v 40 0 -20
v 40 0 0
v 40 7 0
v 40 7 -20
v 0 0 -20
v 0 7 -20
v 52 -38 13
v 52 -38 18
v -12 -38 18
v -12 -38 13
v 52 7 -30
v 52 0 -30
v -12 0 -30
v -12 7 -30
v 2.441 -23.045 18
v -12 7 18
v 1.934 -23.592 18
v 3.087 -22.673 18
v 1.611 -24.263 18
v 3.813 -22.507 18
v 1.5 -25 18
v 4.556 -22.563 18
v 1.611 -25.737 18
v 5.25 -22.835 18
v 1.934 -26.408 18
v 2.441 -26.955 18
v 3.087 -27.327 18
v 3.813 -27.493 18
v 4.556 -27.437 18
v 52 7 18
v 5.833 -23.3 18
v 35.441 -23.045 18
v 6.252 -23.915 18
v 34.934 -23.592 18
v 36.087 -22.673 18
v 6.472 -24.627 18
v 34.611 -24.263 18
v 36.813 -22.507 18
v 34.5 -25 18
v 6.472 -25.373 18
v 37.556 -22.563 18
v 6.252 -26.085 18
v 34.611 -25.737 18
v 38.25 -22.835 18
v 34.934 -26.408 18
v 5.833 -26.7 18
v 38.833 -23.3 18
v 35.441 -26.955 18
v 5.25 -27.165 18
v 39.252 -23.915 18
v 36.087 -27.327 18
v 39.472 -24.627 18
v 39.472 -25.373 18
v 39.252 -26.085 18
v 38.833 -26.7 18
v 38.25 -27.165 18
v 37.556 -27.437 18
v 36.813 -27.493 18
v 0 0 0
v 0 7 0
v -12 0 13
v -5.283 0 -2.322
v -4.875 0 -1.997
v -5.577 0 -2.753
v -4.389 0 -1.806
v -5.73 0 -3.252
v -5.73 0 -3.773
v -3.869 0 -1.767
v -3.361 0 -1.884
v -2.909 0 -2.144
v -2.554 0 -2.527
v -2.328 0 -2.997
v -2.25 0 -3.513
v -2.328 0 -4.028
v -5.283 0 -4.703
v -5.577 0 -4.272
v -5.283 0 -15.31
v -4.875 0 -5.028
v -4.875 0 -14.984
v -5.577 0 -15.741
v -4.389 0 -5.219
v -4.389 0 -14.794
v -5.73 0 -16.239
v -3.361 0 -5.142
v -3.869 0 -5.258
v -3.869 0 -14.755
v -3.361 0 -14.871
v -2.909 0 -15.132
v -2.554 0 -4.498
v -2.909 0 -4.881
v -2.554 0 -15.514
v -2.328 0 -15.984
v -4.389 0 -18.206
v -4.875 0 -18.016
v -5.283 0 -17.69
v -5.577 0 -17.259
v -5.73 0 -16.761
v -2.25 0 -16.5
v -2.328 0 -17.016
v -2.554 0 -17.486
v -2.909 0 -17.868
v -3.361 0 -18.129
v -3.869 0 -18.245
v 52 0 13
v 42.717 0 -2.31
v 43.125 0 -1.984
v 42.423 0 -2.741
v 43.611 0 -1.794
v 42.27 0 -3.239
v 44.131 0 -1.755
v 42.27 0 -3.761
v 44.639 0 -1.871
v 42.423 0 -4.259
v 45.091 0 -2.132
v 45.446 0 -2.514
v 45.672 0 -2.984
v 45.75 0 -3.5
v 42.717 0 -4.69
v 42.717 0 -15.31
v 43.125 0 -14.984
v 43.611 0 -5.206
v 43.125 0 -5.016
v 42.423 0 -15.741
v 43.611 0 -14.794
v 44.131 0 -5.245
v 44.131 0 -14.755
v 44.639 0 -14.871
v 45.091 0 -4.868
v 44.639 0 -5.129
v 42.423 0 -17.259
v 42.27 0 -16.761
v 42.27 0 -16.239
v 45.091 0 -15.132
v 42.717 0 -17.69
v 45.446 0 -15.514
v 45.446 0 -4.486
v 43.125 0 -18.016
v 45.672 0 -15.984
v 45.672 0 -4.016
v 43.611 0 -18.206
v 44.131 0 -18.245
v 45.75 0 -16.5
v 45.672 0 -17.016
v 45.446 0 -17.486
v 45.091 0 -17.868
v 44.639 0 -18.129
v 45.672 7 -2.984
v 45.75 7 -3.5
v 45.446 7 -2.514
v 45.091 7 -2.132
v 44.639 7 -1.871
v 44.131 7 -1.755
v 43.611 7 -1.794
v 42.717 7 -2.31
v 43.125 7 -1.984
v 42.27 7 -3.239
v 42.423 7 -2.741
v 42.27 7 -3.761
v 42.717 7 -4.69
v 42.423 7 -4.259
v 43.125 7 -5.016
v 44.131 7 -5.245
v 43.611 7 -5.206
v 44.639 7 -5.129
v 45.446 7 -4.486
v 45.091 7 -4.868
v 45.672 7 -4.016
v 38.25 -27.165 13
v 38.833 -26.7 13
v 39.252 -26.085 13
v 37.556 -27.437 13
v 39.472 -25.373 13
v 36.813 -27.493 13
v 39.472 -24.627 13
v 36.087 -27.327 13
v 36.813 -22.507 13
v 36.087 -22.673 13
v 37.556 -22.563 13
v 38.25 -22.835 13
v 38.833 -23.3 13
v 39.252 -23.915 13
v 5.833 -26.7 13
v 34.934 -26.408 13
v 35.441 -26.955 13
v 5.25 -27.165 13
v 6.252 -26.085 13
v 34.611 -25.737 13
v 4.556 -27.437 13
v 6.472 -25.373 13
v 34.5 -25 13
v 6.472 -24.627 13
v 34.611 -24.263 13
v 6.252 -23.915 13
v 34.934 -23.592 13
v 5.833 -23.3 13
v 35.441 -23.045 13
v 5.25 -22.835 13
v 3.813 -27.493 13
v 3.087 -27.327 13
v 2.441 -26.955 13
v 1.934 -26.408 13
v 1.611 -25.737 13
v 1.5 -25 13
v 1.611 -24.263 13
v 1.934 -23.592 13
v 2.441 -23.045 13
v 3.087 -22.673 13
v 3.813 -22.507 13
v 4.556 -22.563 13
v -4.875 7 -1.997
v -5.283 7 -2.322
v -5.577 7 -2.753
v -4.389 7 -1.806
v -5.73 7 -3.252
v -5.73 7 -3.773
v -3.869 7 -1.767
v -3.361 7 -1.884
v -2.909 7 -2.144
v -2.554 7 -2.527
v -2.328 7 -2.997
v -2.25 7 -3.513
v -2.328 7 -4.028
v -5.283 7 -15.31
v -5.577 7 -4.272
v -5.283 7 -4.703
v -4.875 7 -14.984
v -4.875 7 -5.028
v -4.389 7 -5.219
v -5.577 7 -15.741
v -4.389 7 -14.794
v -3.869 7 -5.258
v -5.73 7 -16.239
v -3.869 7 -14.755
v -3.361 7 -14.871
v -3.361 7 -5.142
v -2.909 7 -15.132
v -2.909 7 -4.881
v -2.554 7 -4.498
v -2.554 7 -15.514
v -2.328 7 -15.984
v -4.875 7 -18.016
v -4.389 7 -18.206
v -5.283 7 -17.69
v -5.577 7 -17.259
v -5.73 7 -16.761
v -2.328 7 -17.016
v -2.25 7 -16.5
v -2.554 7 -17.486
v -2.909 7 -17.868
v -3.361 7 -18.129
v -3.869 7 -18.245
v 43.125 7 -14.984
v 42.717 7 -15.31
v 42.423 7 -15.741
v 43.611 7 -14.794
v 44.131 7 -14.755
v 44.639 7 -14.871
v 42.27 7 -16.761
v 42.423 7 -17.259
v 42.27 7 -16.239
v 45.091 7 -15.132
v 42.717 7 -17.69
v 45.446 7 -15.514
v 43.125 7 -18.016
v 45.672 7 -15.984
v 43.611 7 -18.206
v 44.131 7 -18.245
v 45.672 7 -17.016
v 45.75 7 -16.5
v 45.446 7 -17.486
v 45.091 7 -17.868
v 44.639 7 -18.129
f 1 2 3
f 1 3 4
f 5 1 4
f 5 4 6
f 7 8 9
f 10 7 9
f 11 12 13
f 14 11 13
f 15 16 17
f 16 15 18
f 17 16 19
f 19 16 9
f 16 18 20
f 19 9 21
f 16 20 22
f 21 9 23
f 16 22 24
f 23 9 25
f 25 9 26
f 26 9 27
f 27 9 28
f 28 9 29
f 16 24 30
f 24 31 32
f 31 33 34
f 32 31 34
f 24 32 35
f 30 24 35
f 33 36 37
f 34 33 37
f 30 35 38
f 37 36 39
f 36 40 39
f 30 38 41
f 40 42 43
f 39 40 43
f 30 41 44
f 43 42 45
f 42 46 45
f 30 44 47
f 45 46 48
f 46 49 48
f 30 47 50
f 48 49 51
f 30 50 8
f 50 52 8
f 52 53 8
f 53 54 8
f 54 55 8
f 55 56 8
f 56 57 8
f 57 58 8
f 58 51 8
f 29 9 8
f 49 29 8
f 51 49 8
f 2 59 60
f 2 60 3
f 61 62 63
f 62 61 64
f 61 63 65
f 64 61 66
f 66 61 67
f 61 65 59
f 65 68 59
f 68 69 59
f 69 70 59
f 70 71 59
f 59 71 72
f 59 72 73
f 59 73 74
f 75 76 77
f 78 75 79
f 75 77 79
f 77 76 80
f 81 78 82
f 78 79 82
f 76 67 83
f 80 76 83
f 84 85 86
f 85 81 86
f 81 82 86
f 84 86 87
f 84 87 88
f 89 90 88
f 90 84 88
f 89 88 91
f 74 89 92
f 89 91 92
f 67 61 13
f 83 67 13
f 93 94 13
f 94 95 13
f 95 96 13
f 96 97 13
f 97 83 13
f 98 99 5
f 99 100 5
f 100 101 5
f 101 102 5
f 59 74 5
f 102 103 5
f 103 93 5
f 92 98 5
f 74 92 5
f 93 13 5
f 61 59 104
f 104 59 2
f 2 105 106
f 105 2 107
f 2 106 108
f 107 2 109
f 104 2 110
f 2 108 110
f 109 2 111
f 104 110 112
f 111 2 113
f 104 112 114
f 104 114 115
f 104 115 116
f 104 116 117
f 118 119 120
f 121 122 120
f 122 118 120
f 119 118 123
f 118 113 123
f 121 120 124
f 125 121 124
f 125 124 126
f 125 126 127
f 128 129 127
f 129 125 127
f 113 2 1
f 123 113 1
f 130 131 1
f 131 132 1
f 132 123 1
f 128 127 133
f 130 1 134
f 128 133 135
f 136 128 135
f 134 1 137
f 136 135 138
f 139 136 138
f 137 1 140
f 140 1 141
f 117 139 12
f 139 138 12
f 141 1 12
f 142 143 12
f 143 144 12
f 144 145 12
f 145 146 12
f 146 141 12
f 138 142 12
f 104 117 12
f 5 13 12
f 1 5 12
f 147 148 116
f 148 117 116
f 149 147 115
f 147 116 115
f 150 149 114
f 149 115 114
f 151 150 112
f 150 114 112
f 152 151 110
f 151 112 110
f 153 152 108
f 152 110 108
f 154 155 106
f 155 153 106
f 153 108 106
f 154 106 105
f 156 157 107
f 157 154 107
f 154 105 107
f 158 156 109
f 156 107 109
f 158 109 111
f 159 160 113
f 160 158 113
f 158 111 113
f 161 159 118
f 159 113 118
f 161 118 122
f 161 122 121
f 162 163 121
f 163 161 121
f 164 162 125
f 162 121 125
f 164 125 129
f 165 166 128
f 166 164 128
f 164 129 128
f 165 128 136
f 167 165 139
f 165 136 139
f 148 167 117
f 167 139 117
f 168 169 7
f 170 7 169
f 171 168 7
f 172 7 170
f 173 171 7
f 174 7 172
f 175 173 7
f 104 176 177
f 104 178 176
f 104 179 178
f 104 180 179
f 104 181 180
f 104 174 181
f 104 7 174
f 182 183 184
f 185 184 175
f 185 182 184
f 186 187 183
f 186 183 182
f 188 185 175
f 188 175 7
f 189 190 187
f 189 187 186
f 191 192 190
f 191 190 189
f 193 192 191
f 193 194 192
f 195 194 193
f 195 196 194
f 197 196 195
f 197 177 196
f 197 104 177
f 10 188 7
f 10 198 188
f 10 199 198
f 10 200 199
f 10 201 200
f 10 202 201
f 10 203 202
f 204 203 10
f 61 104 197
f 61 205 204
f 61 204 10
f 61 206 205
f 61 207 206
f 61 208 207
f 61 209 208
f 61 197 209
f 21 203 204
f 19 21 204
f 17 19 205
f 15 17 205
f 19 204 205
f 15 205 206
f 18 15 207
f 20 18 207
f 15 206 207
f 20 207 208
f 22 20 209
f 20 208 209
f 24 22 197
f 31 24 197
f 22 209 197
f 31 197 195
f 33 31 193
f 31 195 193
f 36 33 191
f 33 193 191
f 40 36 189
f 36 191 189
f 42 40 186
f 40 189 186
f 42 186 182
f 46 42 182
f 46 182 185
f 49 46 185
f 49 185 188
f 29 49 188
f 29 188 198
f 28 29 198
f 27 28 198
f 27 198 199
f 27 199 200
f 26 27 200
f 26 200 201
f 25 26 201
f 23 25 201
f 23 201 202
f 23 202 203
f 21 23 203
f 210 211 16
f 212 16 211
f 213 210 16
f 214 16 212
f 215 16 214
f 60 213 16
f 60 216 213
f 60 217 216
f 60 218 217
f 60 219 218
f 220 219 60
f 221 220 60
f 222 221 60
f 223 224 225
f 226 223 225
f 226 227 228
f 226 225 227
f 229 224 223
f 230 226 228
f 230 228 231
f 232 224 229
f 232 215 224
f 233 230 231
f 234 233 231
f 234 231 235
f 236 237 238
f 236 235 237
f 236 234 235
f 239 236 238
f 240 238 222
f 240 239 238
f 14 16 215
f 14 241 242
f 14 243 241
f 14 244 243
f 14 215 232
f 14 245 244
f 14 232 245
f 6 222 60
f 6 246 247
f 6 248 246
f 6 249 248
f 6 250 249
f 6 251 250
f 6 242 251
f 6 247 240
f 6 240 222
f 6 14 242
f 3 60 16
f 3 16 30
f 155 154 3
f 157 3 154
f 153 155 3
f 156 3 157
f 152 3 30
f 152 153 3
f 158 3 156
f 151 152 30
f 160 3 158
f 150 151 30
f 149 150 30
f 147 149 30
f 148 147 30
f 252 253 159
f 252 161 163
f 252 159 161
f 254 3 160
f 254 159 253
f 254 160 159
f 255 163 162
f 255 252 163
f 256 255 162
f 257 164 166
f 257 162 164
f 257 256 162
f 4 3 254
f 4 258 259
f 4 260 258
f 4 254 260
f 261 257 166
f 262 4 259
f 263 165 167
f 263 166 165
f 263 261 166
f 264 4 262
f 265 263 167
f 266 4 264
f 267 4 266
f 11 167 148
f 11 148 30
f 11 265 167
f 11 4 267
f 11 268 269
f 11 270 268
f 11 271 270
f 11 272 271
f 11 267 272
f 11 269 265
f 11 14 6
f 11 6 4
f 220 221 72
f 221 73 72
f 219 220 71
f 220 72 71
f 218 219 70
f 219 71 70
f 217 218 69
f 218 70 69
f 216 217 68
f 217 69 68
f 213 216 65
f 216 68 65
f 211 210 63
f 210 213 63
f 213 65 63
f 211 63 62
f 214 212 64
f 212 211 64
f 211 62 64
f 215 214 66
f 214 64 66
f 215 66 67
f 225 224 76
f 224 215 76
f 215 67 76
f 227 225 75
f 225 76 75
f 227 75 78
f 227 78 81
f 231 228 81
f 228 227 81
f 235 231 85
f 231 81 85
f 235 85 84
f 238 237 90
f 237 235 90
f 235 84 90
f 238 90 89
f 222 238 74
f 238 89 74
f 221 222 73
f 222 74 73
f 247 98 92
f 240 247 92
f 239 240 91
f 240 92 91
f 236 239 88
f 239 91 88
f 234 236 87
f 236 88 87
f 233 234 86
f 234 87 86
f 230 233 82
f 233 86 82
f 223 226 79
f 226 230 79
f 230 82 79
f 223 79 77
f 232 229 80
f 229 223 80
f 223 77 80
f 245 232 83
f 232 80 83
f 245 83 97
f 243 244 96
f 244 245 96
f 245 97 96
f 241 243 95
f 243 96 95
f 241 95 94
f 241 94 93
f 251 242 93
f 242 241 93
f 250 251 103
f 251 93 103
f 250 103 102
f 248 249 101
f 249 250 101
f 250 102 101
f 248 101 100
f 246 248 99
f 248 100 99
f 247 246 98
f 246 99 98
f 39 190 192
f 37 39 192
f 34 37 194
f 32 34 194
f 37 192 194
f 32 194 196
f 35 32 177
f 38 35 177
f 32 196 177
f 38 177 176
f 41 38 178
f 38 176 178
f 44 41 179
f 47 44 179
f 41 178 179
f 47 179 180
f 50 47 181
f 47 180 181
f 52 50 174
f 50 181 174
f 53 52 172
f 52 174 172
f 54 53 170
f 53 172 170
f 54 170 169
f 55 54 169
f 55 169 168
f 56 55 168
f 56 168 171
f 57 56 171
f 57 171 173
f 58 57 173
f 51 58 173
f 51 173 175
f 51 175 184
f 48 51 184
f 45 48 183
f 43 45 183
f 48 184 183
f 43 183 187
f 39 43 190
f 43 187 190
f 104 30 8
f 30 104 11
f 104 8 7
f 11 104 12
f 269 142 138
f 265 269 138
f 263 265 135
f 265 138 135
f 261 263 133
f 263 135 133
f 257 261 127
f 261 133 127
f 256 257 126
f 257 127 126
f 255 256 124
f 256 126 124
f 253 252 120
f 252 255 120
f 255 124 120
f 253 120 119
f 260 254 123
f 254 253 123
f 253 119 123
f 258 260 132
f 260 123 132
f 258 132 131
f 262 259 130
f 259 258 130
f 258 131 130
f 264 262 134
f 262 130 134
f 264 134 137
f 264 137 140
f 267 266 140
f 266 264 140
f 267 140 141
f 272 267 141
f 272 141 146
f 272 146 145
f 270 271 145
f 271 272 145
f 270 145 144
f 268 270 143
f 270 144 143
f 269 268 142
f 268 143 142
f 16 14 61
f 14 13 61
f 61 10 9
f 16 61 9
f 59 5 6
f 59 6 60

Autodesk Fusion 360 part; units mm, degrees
sketch "Sketch1" plane through (0, 0, 0) normal (0, 1, 0) x (1, 0, 0)
sketch "Sketch2" plane through (0, 0, 0) normal (0, 1, 0) x (1, 0, 0)
  line L0 (0, 0) -> (40, 0)
  line L1 (40, 0) -> (40, 20)
  line L2 (40, 20) -> (0, 20)
  line L3 (0, 20) -> (0, 0)
  line L4 (-12, -18) -> (52, -18)
  line L5 (52, -18) -> (52, 30)
  line L6 (52, 30) -> (-12, 30)
  line L7 (-12, 30) -> (-12, -18)
  line L8 (44, 20) -> (44, 16.5) construction
  line L9 (44, 0) -> (44, 3.5) construction
  line L10 (40, 16.5) -> (44, 16.5) construction
  line L11 (40, 3.5) -> (44, 3.5) construction
  circle A0 centre (44, 16.5) radius 1.75
  circle A1 centre (44, 3.5) radius 1.75
  line L12 (-4, 20) -> (-4, 16.5) construction
  line L13 (0, 16.5) -> (-4, 16.5) construction
  line L14 (0, 3.5142) -> (-4, 3.5126) construction
  line L15 (-4, 0.0126) -> (-4, 3.5126) construction
  circle A2 centre (-4, 16.5) radius 1.75
  circle A3 centre (-4, 3.5126) radius 1.75
  dimension "d1" = 40
  dimension "d2" = 20
  dimension "d8" = 18
  dimension "d9" = 10
  dimension "d10" = 3.5
  dimension "d11" = 3.5
  dimension "d12" = 4
  dimension "d13" = 4
  dimension "d14" = 3.5
  dimension "d15" = 3.5
  dimension "d16" = 3.5
  dimension "d17" = 4
  dimension "d18" = 4
  dimension "d19" = 3.5
  dimension "d20" = 3.5
  dimension "d21" = 3.5
  dimension "d22" = 12
  dimension "d23" = 12
extrude "Extrude1" add sketch "Sketch2" along normal blind 7
sketch "Sketch3" plane through (0, 7, 0) normal (0, 1, 0) x (-1, 0, 0)
  circle A0 centre (4, -3.5126) radius 1.75
  circle A1 centre (-44, -16.5) radius 1.75
  circle A2 centre (4, -16.5) radius 1.75
  circle A3 centre (-44, -3.5) radius 1.75
  line L0 (0, 0) -> (0, -20)
  line L1 (0, -20) -> (-40, -20)
  line L2 (-40, -20) -> (-40, 0)
  line L3 (-40, 0) -> (0, 0)
  line L4 (12, -30) -> (12, 18)
  line L5 (12, 18) -> (-52, 18)
  line L6 (-52, 18) -> (-52, -30)
  line L7 (-52, -30) -> (12, -30)
  line L8 (12, 18) -> (-52, 18)
  line L9 (-52, 18) -> (-52, 13)
  line L10 (-52, 13) -> (12, 13)
  line L11 (12, 13) -> (12, 18)
  dimension "d26" = 5
extrude "Extrude2" add sketch "Sketch3" against normal blind 45 contours L4 L5 L6 L8 L9 L10 L11
sketch "Sketch4" plane through (0, 0, 13) normal (0, 0, -1) x (-1, 0, 0)
  line L0 (12, 0) -> (-52, 0)
  line L1 (-52, 0) -> (-52, -38)
  line L2 (-52, -38) -> (12, -38)
  line L3 (12, -38) -> (12, 0)
  circle A0 centre (-37, -25) radius 2.5
  circle A1 centre (-4, -25) radius 2.5
  dimension "d29" = 5
  dimension "d30" = 5
extrude "Extrude3" cut sketch "Sketch4" against normal blind 10 contours A0 | A1
